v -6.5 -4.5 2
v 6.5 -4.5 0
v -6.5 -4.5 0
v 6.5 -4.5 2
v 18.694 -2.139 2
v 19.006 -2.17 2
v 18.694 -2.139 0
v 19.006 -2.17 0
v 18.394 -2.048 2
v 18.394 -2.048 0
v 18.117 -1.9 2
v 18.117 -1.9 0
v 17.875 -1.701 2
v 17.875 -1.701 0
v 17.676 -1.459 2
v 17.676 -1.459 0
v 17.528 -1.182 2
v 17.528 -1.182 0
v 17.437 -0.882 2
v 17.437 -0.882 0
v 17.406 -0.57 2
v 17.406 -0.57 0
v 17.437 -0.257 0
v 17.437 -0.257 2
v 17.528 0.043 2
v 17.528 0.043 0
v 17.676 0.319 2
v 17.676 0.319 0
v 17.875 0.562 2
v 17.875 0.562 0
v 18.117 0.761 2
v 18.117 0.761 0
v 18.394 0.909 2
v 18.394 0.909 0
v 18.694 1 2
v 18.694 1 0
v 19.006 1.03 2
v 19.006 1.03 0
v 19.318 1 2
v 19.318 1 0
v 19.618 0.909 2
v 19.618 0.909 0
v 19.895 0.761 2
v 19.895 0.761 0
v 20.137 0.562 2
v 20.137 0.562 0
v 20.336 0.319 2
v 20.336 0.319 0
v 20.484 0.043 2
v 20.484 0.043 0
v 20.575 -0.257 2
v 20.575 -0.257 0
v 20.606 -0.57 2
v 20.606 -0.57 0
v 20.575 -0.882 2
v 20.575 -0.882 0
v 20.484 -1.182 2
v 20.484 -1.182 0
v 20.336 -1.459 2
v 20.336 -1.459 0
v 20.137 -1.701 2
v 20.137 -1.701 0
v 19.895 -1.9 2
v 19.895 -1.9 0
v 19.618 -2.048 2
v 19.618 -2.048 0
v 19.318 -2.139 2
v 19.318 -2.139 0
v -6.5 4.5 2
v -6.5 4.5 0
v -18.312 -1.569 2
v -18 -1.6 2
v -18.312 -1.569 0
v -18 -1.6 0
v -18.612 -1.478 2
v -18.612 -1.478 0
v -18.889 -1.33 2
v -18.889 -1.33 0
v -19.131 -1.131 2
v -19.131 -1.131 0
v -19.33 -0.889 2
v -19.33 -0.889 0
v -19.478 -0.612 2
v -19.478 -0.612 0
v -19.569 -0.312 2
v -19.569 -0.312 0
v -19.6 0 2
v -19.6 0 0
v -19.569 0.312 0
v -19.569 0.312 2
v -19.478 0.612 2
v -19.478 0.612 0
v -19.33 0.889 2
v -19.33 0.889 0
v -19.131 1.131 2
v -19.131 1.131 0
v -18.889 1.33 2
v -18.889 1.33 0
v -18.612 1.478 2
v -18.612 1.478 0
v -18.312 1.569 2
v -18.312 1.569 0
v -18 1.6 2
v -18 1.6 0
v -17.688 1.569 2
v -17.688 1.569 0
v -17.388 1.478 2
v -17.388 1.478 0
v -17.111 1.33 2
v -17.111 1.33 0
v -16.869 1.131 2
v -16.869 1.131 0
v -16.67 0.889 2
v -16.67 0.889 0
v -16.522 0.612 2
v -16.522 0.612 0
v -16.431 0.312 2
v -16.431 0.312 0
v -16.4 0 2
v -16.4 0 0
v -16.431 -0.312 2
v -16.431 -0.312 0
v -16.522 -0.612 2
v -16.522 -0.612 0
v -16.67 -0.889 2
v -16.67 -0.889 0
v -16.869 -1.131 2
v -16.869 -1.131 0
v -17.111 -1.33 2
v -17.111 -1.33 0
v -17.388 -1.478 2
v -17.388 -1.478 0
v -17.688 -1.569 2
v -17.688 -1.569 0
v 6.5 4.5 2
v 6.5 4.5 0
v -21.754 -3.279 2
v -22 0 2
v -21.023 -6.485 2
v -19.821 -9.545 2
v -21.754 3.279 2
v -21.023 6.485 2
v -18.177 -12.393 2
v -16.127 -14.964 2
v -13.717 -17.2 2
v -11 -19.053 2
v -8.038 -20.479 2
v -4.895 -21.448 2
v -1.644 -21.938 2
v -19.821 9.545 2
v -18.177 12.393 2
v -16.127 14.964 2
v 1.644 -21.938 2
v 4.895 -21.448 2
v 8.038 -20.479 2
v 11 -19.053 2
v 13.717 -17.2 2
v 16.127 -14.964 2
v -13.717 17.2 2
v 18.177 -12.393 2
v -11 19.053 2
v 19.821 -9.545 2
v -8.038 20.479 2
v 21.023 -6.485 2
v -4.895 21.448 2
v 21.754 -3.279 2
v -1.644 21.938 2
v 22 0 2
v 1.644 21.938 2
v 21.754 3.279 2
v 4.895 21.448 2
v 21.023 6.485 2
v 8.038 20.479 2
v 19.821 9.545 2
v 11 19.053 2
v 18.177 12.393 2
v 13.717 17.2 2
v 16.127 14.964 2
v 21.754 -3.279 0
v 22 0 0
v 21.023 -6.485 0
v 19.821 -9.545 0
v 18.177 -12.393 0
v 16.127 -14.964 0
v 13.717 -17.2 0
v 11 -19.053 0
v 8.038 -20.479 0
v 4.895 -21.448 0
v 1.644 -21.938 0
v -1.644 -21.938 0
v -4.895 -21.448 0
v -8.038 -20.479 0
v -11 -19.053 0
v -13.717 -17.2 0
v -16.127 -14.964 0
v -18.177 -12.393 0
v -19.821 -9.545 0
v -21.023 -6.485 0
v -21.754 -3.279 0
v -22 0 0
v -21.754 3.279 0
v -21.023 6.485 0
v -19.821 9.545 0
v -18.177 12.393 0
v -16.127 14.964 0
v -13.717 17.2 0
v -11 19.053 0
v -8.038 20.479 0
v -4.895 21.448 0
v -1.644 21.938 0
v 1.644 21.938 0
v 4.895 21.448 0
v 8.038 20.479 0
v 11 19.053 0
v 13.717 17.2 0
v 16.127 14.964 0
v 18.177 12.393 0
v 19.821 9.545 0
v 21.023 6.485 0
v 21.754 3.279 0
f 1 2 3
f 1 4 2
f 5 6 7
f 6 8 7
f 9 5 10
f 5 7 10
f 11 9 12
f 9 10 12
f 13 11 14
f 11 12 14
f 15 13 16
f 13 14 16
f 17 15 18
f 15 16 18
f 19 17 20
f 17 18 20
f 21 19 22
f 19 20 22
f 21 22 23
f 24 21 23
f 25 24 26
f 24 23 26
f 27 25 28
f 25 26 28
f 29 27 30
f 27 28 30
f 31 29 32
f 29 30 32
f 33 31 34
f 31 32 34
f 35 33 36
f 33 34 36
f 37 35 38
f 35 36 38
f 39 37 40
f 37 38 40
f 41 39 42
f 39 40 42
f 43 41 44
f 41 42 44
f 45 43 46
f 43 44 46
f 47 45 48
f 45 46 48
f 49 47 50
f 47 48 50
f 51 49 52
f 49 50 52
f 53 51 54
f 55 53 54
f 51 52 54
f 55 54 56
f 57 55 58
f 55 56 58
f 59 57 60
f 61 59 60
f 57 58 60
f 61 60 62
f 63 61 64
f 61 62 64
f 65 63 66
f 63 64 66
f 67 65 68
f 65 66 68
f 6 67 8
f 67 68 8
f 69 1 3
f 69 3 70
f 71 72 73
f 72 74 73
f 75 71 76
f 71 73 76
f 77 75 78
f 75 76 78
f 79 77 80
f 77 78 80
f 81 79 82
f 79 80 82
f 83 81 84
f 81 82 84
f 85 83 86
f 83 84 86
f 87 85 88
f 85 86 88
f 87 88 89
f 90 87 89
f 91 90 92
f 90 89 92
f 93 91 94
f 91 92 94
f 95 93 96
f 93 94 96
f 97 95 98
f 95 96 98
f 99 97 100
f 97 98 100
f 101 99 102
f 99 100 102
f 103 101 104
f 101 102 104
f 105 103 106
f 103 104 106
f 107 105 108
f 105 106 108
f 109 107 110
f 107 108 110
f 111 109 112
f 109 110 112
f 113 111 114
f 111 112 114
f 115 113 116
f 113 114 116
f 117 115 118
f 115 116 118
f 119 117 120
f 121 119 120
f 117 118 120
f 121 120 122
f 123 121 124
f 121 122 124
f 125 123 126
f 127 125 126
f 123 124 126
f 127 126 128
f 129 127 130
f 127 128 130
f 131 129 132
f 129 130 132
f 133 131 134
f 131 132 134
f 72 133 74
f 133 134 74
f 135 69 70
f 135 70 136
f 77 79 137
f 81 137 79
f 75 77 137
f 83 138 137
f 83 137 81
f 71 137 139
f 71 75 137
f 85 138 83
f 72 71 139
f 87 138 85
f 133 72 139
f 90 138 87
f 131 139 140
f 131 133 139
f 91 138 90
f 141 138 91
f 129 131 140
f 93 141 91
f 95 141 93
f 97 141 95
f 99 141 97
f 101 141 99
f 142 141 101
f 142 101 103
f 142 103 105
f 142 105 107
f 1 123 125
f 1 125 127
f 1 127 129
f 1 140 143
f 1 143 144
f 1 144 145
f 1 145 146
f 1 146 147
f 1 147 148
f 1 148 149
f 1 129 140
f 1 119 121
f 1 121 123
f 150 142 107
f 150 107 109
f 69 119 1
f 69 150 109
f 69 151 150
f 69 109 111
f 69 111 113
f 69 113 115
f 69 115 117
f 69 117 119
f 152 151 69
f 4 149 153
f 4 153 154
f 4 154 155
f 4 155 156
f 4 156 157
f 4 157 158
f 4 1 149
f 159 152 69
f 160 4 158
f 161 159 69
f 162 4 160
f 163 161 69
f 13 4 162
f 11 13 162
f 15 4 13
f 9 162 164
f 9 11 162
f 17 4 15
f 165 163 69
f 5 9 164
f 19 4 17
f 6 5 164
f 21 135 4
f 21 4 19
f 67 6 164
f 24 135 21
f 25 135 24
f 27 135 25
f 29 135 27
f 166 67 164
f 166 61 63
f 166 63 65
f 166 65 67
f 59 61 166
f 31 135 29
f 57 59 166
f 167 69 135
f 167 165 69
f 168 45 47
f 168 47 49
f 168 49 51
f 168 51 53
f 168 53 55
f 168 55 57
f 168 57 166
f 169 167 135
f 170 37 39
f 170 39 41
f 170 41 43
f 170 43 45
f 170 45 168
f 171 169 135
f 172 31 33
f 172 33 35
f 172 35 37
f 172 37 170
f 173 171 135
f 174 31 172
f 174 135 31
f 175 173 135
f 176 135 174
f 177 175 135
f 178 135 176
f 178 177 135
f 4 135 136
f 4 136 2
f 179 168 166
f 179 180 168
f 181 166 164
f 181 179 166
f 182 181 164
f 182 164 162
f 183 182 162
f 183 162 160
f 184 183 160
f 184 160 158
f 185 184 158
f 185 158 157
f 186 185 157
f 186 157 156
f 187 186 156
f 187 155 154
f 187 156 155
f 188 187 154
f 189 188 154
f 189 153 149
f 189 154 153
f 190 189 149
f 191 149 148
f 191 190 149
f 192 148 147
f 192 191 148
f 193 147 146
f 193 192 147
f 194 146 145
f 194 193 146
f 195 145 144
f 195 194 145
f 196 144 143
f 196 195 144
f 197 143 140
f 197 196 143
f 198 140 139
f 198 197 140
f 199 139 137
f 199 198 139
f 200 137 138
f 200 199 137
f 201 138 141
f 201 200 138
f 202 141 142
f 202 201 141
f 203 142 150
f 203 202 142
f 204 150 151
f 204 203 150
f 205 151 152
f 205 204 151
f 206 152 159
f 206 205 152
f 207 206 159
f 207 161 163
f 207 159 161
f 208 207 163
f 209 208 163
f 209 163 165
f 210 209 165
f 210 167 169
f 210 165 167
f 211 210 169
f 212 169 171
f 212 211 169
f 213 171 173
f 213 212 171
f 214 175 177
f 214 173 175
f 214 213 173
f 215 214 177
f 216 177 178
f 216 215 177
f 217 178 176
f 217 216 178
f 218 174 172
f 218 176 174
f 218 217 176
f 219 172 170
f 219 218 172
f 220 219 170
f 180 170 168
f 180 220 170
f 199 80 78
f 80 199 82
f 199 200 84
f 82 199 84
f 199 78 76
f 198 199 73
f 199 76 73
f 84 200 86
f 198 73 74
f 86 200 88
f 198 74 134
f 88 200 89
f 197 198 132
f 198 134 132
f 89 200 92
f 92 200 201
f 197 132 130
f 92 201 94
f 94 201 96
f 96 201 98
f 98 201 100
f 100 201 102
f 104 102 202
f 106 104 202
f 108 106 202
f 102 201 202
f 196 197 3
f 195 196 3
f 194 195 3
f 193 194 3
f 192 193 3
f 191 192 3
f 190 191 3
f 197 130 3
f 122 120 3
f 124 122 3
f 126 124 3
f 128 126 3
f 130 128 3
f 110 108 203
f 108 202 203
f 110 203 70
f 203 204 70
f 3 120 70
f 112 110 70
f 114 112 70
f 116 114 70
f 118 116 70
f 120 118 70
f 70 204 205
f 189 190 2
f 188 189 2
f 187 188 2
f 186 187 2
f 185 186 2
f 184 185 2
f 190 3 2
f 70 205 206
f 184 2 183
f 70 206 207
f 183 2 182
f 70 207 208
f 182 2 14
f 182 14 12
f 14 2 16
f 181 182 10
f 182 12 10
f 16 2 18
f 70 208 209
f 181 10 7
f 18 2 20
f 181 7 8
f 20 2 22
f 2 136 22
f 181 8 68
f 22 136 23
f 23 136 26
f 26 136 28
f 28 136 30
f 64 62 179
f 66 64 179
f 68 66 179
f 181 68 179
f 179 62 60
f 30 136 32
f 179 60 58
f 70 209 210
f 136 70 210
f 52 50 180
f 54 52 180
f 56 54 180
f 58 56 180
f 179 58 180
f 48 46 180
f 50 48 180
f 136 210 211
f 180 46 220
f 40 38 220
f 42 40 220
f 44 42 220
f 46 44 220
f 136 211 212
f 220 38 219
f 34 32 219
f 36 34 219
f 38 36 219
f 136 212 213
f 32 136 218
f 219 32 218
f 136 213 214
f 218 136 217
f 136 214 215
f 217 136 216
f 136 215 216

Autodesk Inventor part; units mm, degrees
ref_plane "YZ Plane" through (0, 0, 0) normal (1, 0, 0) x (0, 1, 0)
ref_plane "XZ Plane" through (0, 0, 0) normal (0, 1, 0) x (-1, 0, 0)
ref_plane "XY Plane" through (0, 0, 0) normal (0, 0, 1) x (1, 0, 0)
ref_plane "Arbeitsebene1" through (0, 0, 0) normal (0, 0, 1) x (1, 0, 0)
sketch "Skizze1" plane through (0, 0, 0) normal (0, 0, 1) x (1, 0, 0)
  circle A0 centre (0, 0) radius 22 projected
  point P0 (0, 0)
extrude "Extrusion1" add sketch "Skizze1" along normal blind 2
sketch "Skizze2" plane through (0, 0, 2) normal (0, 0, 1) x (1, 0, 0)
  circle A0 centre (-18, 0) radius 1.6 projected
  circle A1 centre (18, 0) radius 1.6 projected
  point P0 (0, 0)
  point P1 (19.0059, -0.5696)
hole "Bohrung1" at (-18, 0, 2) at (19.0059, -0.5696, 2) direction (0, 0, -1) diameter 3.2 end through all
sketch "Skizze3" plane through (0, 0, 2) normal (0, 0, 1) x (1, 0, 0)
  line L0 (6.5, -4.5) -> (-6.5, -4.5)
  line L1 (-6.5, -4.5) -> (-6.5, 4.5)
  line L2 (-6.5, 4.5) -> (6.5, 4.5)
  line L3 (6.5, 4.5) -> (6.5, -4.5)
  line L4 (6.5, -4.5) -> (-6.5, 4.5) construction
  line L5 (-6.5, -4.5) -> (6.5, 4.5) construction
  point P0 (0, 0)
  dimension "d9" = 13
  dimension "d10" = 9
extrude "Extrusion2" cut sketch "Skizze3" against normal blind 10
properties part number "led_deckel"
